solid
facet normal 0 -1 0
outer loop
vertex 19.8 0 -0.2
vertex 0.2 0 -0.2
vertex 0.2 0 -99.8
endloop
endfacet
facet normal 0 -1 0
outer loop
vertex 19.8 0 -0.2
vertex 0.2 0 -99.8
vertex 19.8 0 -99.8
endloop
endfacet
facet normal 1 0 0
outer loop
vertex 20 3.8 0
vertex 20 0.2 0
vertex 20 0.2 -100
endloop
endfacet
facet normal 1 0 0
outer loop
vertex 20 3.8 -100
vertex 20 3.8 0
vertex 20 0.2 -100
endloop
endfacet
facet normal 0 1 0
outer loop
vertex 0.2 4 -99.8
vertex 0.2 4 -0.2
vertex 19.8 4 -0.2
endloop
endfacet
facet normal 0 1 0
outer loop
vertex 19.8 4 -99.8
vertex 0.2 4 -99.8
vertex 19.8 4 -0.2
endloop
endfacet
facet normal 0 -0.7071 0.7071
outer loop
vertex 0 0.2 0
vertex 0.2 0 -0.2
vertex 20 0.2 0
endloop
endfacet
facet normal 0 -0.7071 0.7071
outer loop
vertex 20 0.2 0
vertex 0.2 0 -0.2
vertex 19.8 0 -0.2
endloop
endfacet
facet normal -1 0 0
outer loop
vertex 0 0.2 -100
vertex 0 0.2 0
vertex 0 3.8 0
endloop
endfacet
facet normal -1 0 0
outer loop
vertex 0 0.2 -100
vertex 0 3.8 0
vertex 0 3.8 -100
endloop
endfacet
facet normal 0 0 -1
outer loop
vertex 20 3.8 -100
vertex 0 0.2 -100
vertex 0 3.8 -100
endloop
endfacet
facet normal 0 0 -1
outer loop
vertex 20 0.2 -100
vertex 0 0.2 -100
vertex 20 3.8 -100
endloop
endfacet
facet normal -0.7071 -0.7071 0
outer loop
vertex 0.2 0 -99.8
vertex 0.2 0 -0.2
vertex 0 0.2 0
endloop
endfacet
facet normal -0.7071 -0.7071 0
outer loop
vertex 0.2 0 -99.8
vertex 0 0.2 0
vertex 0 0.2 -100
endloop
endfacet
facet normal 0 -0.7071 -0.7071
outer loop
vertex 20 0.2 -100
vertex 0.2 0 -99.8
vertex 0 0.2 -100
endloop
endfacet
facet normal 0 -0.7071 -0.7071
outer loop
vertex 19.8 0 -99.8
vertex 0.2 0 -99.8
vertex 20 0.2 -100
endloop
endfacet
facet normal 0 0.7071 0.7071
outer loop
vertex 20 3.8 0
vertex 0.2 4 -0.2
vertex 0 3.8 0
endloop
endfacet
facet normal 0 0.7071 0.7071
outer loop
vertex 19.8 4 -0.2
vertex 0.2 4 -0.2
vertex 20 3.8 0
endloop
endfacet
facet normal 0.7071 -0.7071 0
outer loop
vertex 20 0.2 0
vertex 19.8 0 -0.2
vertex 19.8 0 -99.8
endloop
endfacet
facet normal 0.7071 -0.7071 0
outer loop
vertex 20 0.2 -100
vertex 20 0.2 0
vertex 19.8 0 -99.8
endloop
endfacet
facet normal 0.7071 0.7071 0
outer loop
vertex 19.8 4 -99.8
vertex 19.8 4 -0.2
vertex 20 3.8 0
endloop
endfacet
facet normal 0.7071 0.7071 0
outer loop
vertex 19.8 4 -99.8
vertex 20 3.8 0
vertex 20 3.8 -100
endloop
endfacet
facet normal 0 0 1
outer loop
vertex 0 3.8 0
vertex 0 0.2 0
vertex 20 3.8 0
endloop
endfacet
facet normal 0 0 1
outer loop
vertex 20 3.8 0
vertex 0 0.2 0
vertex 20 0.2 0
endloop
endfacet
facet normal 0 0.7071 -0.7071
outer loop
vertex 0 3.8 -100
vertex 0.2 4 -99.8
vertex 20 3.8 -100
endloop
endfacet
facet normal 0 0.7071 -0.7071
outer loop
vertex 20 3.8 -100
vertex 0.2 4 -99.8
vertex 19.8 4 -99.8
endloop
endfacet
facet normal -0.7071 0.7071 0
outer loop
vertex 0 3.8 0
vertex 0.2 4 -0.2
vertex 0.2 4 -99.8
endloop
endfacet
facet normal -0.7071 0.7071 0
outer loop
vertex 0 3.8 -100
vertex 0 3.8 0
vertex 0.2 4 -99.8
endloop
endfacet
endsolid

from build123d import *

# Parameters (mm, degrees)
SKETCH_1_W      = 20
SKETCH_1_H      = 100
EXTRUDE_1_DEPTH = 4
CHAMFER_1_SIZE  = 0.2


with BuildPart() as part:
    # 草图1 → 凸台-拉伸1 (new body)
    with BuildSketch(Plane(origin=(0, 0, 0), x_dir=(1, 0, 0), z_dir=(0, 1, 0))):
        with Locations((10, 50)):
            Rectangle(SKETCH_1_W, SKETCH_1_H)
    extrude(amount=EXTRUDE_1_DEPTH)

    # 倒角1
    chamfer_1_edges = [part.edges().sort_by_distance(p)[0] for p in [
        (20, 4, -50),
        (10, 4, -100),
        (0, 4, -50),
        (10, 0, -100),
        (20, 0, -50),
        (10, 0, 0),
        (0, 0, -50),
        (10, 4, 0),
    ]]
    chamfer(chamfer_1_edges, length=CHAMFER_1_SIZE)


solid = part.part
